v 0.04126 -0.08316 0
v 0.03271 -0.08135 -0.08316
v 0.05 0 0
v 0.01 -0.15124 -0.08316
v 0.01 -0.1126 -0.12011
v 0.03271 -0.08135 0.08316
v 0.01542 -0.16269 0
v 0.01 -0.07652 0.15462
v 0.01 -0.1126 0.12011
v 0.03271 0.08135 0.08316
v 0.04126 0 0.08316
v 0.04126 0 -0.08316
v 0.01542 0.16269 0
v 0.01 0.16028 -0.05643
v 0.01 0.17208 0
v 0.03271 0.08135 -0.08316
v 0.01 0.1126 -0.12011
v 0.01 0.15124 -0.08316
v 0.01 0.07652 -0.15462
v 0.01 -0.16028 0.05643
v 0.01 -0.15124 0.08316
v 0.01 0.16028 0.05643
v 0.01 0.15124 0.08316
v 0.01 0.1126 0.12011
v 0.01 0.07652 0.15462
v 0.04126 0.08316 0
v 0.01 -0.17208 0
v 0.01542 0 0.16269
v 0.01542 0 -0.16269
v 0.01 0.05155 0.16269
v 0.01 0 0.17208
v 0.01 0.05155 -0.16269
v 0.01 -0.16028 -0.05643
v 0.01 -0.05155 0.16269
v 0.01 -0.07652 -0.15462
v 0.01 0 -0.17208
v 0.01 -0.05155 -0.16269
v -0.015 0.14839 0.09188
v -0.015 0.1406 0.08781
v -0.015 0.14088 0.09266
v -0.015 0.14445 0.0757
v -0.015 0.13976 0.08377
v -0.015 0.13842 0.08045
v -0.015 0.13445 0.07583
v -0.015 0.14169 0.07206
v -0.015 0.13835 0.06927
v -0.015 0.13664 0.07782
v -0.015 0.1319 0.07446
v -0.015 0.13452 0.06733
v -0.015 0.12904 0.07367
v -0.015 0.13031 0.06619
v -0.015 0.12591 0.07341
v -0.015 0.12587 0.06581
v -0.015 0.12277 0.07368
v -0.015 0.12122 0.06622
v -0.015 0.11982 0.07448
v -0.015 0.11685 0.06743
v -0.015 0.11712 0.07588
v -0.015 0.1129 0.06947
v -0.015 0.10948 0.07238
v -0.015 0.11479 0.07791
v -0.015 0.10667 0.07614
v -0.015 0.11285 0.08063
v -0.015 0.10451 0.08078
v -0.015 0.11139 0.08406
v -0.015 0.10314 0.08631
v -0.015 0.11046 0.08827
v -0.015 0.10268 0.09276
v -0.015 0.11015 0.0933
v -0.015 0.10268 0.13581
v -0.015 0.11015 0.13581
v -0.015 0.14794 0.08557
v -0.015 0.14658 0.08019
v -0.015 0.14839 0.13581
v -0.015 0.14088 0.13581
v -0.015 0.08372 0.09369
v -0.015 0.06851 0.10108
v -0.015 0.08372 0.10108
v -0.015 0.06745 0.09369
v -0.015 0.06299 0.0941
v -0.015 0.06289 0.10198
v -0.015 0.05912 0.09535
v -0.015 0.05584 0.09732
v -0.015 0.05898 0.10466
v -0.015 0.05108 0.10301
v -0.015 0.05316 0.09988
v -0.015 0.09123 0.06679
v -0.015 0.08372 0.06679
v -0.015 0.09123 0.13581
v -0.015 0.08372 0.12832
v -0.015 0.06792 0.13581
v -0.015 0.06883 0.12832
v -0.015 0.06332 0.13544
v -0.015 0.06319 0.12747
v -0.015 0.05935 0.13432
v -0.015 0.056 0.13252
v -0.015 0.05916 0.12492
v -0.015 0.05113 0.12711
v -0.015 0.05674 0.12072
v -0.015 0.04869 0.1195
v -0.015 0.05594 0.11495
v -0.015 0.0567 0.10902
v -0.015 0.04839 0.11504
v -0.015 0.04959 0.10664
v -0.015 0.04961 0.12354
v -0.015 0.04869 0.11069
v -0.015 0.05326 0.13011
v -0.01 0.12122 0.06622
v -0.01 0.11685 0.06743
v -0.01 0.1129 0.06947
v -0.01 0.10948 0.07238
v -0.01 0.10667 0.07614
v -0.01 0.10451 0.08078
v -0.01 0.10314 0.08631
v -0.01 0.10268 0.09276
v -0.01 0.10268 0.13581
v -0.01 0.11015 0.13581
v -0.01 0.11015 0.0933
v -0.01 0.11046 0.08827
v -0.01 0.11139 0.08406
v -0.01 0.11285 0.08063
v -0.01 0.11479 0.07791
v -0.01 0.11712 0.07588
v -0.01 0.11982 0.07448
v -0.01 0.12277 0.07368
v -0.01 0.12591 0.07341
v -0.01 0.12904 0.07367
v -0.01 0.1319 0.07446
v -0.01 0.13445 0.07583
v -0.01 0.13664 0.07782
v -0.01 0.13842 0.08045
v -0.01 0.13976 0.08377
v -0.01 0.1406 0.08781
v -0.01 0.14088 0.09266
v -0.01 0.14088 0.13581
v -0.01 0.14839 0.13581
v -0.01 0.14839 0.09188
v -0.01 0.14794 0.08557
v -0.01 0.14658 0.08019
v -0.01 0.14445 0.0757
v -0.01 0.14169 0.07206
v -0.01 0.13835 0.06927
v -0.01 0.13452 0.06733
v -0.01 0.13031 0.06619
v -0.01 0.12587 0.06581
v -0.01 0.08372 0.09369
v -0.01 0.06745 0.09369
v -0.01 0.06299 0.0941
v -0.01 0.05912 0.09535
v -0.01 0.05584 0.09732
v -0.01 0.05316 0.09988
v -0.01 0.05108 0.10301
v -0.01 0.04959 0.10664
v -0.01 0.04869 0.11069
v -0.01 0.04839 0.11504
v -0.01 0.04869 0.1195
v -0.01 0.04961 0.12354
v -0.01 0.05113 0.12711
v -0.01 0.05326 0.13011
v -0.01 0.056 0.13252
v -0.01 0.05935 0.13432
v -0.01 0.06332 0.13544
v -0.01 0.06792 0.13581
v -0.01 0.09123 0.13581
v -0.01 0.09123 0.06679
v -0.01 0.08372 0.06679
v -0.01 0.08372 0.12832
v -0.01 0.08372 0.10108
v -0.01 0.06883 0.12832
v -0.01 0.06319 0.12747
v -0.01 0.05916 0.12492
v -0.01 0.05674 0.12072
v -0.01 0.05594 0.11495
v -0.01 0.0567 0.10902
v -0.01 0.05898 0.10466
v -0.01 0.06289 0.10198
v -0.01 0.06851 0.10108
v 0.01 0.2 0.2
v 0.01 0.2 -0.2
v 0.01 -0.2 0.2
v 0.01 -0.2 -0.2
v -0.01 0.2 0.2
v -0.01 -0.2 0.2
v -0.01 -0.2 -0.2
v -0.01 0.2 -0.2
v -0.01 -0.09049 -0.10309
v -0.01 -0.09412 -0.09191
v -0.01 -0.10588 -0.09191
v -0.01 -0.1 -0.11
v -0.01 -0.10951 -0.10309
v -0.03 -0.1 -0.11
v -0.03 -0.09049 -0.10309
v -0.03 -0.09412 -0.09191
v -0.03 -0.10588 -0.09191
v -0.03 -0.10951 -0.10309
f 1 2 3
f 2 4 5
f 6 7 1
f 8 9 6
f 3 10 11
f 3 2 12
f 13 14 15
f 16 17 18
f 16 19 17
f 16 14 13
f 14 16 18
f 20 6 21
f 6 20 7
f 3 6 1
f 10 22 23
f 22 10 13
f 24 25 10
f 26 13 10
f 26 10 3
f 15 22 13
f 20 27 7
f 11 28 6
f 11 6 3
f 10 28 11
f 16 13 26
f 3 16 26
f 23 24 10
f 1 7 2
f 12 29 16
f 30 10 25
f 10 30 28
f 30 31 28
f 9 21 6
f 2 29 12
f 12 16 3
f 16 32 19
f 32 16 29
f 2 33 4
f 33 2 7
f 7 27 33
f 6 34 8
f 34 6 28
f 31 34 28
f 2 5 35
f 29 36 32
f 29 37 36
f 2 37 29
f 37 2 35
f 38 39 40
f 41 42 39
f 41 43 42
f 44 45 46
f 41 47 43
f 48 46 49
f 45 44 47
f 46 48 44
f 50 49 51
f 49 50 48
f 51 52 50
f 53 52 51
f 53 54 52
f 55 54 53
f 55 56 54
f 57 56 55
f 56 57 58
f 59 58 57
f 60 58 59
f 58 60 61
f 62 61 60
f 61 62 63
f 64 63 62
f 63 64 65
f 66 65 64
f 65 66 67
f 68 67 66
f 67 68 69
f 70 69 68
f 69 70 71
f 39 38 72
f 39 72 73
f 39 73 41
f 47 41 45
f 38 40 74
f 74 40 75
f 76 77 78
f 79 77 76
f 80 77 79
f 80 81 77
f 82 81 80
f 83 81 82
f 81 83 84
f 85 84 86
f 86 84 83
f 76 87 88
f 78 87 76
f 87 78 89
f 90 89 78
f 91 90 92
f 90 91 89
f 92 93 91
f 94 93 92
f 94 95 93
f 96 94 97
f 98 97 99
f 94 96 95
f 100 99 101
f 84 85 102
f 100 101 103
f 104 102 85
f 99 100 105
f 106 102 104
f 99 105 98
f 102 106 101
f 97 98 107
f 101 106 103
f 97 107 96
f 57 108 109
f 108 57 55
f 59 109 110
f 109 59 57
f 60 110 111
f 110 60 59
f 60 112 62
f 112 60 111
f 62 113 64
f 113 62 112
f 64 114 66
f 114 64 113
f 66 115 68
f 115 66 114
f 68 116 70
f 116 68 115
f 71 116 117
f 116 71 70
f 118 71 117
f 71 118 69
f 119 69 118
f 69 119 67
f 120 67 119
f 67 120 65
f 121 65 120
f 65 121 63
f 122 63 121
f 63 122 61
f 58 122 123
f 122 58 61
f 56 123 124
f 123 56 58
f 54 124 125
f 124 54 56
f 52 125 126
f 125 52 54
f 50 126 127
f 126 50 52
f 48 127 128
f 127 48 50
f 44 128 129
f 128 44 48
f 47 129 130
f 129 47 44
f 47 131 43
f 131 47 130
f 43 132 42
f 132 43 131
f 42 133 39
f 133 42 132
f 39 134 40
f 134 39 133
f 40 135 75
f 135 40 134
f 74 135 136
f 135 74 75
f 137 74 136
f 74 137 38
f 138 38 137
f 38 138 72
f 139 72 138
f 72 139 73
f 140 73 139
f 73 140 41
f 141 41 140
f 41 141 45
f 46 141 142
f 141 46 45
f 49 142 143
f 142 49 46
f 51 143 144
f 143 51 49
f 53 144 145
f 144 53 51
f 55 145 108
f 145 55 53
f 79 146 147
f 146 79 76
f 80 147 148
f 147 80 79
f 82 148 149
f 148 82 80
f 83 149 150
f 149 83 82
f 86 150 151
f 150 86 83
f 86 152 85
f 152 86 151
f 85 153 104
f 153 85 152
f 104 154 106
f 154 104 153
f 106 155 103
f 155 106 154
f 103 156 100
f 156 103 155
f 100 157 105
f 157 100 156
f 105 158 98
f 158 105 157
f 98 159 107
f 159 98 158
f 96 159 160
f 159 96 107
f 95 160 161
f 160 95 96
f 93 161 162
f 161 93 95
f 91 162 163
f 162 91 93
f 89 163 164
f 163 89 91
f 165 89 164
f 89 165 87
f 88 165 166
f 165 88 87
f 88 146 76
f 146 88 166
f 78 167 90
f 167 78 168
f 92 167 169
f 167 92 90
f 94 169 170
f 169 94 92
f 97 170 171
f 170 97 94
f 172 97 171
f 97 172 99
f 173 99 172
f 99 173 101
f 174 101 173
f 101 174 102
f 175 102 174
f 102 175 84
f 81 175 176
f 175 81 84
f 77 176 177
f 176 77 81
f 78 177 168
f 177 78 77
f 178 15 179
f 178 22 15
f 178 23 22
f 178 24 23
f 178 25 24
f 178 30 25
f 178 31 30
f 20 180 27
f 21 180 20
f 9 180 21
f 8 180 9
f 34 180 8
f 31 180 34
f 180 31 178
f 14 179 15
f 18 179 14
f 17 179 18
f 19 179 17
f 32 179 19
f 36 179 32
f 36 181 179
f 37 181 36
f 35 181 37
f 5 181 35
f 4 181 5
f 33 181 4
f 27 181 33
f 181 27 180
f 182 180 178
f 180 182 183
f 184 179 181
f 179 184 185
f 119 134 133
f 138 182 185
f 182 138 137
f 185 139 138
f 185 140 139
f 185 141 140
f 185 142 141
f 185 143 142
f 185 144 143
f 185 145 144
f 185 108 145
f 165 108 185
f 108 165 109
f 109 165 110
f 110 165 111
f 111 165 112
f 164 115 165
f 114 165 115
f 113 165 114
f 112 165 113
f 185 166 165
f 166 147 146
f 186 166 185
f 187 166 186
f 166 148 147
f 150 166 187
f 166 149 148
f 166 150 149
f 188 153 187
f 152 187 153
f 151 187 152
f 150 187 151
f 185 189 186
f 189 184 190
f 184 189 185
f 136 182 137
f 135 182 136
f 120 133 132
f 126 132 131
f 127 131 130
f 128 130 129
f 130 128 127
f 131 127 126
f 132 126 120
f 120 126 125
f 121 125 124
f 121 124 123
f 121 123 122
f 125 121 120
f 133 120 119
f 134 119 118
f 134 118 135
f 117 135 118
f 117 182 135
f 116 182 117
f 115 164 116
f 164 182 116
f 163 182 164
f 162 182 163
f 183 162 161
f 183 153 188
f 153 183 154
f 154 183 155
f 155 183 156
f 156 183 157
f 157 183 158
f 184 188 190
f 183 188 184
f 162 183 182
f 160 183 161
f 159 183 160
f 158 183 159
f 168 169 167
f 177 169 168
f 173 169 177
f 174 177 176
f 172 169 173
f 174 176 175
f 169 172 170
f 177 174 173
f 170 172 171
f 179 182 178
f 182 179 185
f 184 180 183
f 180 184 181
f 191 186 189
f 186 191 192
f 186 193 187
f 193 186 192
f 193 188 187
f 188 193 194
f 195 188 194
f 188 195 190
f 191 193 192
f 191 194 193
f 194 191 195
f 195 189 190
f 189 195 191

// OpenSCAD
union() {
    translate([-0.005, 0.1, 0.1])
        rotate(a=[90,0,-90]) {
                color("Black")
                resize(newsize=[0.1,0.07,0])
                linear_extrude(0.01)
                    text("UP",size=1, halign = "center",valign= "center");
        }        
    cube([0.02,0.4,0.4], center = true);      
    translate([-0.35, 0, 0])
        difference() {
            scale(0.02)
                sphere(r = 20);
             translate([-0.15, 0, 0])
               cube([1.0,2.0,2.0], center = true);     
        }
    translate([-0.01, -0.1, -0.1])
        rotate(a=[0,90,0]) {
            scale(0.02)
                cylinder( h=2,r1= 0.5,r2=0.5,center= true);
        }
}
